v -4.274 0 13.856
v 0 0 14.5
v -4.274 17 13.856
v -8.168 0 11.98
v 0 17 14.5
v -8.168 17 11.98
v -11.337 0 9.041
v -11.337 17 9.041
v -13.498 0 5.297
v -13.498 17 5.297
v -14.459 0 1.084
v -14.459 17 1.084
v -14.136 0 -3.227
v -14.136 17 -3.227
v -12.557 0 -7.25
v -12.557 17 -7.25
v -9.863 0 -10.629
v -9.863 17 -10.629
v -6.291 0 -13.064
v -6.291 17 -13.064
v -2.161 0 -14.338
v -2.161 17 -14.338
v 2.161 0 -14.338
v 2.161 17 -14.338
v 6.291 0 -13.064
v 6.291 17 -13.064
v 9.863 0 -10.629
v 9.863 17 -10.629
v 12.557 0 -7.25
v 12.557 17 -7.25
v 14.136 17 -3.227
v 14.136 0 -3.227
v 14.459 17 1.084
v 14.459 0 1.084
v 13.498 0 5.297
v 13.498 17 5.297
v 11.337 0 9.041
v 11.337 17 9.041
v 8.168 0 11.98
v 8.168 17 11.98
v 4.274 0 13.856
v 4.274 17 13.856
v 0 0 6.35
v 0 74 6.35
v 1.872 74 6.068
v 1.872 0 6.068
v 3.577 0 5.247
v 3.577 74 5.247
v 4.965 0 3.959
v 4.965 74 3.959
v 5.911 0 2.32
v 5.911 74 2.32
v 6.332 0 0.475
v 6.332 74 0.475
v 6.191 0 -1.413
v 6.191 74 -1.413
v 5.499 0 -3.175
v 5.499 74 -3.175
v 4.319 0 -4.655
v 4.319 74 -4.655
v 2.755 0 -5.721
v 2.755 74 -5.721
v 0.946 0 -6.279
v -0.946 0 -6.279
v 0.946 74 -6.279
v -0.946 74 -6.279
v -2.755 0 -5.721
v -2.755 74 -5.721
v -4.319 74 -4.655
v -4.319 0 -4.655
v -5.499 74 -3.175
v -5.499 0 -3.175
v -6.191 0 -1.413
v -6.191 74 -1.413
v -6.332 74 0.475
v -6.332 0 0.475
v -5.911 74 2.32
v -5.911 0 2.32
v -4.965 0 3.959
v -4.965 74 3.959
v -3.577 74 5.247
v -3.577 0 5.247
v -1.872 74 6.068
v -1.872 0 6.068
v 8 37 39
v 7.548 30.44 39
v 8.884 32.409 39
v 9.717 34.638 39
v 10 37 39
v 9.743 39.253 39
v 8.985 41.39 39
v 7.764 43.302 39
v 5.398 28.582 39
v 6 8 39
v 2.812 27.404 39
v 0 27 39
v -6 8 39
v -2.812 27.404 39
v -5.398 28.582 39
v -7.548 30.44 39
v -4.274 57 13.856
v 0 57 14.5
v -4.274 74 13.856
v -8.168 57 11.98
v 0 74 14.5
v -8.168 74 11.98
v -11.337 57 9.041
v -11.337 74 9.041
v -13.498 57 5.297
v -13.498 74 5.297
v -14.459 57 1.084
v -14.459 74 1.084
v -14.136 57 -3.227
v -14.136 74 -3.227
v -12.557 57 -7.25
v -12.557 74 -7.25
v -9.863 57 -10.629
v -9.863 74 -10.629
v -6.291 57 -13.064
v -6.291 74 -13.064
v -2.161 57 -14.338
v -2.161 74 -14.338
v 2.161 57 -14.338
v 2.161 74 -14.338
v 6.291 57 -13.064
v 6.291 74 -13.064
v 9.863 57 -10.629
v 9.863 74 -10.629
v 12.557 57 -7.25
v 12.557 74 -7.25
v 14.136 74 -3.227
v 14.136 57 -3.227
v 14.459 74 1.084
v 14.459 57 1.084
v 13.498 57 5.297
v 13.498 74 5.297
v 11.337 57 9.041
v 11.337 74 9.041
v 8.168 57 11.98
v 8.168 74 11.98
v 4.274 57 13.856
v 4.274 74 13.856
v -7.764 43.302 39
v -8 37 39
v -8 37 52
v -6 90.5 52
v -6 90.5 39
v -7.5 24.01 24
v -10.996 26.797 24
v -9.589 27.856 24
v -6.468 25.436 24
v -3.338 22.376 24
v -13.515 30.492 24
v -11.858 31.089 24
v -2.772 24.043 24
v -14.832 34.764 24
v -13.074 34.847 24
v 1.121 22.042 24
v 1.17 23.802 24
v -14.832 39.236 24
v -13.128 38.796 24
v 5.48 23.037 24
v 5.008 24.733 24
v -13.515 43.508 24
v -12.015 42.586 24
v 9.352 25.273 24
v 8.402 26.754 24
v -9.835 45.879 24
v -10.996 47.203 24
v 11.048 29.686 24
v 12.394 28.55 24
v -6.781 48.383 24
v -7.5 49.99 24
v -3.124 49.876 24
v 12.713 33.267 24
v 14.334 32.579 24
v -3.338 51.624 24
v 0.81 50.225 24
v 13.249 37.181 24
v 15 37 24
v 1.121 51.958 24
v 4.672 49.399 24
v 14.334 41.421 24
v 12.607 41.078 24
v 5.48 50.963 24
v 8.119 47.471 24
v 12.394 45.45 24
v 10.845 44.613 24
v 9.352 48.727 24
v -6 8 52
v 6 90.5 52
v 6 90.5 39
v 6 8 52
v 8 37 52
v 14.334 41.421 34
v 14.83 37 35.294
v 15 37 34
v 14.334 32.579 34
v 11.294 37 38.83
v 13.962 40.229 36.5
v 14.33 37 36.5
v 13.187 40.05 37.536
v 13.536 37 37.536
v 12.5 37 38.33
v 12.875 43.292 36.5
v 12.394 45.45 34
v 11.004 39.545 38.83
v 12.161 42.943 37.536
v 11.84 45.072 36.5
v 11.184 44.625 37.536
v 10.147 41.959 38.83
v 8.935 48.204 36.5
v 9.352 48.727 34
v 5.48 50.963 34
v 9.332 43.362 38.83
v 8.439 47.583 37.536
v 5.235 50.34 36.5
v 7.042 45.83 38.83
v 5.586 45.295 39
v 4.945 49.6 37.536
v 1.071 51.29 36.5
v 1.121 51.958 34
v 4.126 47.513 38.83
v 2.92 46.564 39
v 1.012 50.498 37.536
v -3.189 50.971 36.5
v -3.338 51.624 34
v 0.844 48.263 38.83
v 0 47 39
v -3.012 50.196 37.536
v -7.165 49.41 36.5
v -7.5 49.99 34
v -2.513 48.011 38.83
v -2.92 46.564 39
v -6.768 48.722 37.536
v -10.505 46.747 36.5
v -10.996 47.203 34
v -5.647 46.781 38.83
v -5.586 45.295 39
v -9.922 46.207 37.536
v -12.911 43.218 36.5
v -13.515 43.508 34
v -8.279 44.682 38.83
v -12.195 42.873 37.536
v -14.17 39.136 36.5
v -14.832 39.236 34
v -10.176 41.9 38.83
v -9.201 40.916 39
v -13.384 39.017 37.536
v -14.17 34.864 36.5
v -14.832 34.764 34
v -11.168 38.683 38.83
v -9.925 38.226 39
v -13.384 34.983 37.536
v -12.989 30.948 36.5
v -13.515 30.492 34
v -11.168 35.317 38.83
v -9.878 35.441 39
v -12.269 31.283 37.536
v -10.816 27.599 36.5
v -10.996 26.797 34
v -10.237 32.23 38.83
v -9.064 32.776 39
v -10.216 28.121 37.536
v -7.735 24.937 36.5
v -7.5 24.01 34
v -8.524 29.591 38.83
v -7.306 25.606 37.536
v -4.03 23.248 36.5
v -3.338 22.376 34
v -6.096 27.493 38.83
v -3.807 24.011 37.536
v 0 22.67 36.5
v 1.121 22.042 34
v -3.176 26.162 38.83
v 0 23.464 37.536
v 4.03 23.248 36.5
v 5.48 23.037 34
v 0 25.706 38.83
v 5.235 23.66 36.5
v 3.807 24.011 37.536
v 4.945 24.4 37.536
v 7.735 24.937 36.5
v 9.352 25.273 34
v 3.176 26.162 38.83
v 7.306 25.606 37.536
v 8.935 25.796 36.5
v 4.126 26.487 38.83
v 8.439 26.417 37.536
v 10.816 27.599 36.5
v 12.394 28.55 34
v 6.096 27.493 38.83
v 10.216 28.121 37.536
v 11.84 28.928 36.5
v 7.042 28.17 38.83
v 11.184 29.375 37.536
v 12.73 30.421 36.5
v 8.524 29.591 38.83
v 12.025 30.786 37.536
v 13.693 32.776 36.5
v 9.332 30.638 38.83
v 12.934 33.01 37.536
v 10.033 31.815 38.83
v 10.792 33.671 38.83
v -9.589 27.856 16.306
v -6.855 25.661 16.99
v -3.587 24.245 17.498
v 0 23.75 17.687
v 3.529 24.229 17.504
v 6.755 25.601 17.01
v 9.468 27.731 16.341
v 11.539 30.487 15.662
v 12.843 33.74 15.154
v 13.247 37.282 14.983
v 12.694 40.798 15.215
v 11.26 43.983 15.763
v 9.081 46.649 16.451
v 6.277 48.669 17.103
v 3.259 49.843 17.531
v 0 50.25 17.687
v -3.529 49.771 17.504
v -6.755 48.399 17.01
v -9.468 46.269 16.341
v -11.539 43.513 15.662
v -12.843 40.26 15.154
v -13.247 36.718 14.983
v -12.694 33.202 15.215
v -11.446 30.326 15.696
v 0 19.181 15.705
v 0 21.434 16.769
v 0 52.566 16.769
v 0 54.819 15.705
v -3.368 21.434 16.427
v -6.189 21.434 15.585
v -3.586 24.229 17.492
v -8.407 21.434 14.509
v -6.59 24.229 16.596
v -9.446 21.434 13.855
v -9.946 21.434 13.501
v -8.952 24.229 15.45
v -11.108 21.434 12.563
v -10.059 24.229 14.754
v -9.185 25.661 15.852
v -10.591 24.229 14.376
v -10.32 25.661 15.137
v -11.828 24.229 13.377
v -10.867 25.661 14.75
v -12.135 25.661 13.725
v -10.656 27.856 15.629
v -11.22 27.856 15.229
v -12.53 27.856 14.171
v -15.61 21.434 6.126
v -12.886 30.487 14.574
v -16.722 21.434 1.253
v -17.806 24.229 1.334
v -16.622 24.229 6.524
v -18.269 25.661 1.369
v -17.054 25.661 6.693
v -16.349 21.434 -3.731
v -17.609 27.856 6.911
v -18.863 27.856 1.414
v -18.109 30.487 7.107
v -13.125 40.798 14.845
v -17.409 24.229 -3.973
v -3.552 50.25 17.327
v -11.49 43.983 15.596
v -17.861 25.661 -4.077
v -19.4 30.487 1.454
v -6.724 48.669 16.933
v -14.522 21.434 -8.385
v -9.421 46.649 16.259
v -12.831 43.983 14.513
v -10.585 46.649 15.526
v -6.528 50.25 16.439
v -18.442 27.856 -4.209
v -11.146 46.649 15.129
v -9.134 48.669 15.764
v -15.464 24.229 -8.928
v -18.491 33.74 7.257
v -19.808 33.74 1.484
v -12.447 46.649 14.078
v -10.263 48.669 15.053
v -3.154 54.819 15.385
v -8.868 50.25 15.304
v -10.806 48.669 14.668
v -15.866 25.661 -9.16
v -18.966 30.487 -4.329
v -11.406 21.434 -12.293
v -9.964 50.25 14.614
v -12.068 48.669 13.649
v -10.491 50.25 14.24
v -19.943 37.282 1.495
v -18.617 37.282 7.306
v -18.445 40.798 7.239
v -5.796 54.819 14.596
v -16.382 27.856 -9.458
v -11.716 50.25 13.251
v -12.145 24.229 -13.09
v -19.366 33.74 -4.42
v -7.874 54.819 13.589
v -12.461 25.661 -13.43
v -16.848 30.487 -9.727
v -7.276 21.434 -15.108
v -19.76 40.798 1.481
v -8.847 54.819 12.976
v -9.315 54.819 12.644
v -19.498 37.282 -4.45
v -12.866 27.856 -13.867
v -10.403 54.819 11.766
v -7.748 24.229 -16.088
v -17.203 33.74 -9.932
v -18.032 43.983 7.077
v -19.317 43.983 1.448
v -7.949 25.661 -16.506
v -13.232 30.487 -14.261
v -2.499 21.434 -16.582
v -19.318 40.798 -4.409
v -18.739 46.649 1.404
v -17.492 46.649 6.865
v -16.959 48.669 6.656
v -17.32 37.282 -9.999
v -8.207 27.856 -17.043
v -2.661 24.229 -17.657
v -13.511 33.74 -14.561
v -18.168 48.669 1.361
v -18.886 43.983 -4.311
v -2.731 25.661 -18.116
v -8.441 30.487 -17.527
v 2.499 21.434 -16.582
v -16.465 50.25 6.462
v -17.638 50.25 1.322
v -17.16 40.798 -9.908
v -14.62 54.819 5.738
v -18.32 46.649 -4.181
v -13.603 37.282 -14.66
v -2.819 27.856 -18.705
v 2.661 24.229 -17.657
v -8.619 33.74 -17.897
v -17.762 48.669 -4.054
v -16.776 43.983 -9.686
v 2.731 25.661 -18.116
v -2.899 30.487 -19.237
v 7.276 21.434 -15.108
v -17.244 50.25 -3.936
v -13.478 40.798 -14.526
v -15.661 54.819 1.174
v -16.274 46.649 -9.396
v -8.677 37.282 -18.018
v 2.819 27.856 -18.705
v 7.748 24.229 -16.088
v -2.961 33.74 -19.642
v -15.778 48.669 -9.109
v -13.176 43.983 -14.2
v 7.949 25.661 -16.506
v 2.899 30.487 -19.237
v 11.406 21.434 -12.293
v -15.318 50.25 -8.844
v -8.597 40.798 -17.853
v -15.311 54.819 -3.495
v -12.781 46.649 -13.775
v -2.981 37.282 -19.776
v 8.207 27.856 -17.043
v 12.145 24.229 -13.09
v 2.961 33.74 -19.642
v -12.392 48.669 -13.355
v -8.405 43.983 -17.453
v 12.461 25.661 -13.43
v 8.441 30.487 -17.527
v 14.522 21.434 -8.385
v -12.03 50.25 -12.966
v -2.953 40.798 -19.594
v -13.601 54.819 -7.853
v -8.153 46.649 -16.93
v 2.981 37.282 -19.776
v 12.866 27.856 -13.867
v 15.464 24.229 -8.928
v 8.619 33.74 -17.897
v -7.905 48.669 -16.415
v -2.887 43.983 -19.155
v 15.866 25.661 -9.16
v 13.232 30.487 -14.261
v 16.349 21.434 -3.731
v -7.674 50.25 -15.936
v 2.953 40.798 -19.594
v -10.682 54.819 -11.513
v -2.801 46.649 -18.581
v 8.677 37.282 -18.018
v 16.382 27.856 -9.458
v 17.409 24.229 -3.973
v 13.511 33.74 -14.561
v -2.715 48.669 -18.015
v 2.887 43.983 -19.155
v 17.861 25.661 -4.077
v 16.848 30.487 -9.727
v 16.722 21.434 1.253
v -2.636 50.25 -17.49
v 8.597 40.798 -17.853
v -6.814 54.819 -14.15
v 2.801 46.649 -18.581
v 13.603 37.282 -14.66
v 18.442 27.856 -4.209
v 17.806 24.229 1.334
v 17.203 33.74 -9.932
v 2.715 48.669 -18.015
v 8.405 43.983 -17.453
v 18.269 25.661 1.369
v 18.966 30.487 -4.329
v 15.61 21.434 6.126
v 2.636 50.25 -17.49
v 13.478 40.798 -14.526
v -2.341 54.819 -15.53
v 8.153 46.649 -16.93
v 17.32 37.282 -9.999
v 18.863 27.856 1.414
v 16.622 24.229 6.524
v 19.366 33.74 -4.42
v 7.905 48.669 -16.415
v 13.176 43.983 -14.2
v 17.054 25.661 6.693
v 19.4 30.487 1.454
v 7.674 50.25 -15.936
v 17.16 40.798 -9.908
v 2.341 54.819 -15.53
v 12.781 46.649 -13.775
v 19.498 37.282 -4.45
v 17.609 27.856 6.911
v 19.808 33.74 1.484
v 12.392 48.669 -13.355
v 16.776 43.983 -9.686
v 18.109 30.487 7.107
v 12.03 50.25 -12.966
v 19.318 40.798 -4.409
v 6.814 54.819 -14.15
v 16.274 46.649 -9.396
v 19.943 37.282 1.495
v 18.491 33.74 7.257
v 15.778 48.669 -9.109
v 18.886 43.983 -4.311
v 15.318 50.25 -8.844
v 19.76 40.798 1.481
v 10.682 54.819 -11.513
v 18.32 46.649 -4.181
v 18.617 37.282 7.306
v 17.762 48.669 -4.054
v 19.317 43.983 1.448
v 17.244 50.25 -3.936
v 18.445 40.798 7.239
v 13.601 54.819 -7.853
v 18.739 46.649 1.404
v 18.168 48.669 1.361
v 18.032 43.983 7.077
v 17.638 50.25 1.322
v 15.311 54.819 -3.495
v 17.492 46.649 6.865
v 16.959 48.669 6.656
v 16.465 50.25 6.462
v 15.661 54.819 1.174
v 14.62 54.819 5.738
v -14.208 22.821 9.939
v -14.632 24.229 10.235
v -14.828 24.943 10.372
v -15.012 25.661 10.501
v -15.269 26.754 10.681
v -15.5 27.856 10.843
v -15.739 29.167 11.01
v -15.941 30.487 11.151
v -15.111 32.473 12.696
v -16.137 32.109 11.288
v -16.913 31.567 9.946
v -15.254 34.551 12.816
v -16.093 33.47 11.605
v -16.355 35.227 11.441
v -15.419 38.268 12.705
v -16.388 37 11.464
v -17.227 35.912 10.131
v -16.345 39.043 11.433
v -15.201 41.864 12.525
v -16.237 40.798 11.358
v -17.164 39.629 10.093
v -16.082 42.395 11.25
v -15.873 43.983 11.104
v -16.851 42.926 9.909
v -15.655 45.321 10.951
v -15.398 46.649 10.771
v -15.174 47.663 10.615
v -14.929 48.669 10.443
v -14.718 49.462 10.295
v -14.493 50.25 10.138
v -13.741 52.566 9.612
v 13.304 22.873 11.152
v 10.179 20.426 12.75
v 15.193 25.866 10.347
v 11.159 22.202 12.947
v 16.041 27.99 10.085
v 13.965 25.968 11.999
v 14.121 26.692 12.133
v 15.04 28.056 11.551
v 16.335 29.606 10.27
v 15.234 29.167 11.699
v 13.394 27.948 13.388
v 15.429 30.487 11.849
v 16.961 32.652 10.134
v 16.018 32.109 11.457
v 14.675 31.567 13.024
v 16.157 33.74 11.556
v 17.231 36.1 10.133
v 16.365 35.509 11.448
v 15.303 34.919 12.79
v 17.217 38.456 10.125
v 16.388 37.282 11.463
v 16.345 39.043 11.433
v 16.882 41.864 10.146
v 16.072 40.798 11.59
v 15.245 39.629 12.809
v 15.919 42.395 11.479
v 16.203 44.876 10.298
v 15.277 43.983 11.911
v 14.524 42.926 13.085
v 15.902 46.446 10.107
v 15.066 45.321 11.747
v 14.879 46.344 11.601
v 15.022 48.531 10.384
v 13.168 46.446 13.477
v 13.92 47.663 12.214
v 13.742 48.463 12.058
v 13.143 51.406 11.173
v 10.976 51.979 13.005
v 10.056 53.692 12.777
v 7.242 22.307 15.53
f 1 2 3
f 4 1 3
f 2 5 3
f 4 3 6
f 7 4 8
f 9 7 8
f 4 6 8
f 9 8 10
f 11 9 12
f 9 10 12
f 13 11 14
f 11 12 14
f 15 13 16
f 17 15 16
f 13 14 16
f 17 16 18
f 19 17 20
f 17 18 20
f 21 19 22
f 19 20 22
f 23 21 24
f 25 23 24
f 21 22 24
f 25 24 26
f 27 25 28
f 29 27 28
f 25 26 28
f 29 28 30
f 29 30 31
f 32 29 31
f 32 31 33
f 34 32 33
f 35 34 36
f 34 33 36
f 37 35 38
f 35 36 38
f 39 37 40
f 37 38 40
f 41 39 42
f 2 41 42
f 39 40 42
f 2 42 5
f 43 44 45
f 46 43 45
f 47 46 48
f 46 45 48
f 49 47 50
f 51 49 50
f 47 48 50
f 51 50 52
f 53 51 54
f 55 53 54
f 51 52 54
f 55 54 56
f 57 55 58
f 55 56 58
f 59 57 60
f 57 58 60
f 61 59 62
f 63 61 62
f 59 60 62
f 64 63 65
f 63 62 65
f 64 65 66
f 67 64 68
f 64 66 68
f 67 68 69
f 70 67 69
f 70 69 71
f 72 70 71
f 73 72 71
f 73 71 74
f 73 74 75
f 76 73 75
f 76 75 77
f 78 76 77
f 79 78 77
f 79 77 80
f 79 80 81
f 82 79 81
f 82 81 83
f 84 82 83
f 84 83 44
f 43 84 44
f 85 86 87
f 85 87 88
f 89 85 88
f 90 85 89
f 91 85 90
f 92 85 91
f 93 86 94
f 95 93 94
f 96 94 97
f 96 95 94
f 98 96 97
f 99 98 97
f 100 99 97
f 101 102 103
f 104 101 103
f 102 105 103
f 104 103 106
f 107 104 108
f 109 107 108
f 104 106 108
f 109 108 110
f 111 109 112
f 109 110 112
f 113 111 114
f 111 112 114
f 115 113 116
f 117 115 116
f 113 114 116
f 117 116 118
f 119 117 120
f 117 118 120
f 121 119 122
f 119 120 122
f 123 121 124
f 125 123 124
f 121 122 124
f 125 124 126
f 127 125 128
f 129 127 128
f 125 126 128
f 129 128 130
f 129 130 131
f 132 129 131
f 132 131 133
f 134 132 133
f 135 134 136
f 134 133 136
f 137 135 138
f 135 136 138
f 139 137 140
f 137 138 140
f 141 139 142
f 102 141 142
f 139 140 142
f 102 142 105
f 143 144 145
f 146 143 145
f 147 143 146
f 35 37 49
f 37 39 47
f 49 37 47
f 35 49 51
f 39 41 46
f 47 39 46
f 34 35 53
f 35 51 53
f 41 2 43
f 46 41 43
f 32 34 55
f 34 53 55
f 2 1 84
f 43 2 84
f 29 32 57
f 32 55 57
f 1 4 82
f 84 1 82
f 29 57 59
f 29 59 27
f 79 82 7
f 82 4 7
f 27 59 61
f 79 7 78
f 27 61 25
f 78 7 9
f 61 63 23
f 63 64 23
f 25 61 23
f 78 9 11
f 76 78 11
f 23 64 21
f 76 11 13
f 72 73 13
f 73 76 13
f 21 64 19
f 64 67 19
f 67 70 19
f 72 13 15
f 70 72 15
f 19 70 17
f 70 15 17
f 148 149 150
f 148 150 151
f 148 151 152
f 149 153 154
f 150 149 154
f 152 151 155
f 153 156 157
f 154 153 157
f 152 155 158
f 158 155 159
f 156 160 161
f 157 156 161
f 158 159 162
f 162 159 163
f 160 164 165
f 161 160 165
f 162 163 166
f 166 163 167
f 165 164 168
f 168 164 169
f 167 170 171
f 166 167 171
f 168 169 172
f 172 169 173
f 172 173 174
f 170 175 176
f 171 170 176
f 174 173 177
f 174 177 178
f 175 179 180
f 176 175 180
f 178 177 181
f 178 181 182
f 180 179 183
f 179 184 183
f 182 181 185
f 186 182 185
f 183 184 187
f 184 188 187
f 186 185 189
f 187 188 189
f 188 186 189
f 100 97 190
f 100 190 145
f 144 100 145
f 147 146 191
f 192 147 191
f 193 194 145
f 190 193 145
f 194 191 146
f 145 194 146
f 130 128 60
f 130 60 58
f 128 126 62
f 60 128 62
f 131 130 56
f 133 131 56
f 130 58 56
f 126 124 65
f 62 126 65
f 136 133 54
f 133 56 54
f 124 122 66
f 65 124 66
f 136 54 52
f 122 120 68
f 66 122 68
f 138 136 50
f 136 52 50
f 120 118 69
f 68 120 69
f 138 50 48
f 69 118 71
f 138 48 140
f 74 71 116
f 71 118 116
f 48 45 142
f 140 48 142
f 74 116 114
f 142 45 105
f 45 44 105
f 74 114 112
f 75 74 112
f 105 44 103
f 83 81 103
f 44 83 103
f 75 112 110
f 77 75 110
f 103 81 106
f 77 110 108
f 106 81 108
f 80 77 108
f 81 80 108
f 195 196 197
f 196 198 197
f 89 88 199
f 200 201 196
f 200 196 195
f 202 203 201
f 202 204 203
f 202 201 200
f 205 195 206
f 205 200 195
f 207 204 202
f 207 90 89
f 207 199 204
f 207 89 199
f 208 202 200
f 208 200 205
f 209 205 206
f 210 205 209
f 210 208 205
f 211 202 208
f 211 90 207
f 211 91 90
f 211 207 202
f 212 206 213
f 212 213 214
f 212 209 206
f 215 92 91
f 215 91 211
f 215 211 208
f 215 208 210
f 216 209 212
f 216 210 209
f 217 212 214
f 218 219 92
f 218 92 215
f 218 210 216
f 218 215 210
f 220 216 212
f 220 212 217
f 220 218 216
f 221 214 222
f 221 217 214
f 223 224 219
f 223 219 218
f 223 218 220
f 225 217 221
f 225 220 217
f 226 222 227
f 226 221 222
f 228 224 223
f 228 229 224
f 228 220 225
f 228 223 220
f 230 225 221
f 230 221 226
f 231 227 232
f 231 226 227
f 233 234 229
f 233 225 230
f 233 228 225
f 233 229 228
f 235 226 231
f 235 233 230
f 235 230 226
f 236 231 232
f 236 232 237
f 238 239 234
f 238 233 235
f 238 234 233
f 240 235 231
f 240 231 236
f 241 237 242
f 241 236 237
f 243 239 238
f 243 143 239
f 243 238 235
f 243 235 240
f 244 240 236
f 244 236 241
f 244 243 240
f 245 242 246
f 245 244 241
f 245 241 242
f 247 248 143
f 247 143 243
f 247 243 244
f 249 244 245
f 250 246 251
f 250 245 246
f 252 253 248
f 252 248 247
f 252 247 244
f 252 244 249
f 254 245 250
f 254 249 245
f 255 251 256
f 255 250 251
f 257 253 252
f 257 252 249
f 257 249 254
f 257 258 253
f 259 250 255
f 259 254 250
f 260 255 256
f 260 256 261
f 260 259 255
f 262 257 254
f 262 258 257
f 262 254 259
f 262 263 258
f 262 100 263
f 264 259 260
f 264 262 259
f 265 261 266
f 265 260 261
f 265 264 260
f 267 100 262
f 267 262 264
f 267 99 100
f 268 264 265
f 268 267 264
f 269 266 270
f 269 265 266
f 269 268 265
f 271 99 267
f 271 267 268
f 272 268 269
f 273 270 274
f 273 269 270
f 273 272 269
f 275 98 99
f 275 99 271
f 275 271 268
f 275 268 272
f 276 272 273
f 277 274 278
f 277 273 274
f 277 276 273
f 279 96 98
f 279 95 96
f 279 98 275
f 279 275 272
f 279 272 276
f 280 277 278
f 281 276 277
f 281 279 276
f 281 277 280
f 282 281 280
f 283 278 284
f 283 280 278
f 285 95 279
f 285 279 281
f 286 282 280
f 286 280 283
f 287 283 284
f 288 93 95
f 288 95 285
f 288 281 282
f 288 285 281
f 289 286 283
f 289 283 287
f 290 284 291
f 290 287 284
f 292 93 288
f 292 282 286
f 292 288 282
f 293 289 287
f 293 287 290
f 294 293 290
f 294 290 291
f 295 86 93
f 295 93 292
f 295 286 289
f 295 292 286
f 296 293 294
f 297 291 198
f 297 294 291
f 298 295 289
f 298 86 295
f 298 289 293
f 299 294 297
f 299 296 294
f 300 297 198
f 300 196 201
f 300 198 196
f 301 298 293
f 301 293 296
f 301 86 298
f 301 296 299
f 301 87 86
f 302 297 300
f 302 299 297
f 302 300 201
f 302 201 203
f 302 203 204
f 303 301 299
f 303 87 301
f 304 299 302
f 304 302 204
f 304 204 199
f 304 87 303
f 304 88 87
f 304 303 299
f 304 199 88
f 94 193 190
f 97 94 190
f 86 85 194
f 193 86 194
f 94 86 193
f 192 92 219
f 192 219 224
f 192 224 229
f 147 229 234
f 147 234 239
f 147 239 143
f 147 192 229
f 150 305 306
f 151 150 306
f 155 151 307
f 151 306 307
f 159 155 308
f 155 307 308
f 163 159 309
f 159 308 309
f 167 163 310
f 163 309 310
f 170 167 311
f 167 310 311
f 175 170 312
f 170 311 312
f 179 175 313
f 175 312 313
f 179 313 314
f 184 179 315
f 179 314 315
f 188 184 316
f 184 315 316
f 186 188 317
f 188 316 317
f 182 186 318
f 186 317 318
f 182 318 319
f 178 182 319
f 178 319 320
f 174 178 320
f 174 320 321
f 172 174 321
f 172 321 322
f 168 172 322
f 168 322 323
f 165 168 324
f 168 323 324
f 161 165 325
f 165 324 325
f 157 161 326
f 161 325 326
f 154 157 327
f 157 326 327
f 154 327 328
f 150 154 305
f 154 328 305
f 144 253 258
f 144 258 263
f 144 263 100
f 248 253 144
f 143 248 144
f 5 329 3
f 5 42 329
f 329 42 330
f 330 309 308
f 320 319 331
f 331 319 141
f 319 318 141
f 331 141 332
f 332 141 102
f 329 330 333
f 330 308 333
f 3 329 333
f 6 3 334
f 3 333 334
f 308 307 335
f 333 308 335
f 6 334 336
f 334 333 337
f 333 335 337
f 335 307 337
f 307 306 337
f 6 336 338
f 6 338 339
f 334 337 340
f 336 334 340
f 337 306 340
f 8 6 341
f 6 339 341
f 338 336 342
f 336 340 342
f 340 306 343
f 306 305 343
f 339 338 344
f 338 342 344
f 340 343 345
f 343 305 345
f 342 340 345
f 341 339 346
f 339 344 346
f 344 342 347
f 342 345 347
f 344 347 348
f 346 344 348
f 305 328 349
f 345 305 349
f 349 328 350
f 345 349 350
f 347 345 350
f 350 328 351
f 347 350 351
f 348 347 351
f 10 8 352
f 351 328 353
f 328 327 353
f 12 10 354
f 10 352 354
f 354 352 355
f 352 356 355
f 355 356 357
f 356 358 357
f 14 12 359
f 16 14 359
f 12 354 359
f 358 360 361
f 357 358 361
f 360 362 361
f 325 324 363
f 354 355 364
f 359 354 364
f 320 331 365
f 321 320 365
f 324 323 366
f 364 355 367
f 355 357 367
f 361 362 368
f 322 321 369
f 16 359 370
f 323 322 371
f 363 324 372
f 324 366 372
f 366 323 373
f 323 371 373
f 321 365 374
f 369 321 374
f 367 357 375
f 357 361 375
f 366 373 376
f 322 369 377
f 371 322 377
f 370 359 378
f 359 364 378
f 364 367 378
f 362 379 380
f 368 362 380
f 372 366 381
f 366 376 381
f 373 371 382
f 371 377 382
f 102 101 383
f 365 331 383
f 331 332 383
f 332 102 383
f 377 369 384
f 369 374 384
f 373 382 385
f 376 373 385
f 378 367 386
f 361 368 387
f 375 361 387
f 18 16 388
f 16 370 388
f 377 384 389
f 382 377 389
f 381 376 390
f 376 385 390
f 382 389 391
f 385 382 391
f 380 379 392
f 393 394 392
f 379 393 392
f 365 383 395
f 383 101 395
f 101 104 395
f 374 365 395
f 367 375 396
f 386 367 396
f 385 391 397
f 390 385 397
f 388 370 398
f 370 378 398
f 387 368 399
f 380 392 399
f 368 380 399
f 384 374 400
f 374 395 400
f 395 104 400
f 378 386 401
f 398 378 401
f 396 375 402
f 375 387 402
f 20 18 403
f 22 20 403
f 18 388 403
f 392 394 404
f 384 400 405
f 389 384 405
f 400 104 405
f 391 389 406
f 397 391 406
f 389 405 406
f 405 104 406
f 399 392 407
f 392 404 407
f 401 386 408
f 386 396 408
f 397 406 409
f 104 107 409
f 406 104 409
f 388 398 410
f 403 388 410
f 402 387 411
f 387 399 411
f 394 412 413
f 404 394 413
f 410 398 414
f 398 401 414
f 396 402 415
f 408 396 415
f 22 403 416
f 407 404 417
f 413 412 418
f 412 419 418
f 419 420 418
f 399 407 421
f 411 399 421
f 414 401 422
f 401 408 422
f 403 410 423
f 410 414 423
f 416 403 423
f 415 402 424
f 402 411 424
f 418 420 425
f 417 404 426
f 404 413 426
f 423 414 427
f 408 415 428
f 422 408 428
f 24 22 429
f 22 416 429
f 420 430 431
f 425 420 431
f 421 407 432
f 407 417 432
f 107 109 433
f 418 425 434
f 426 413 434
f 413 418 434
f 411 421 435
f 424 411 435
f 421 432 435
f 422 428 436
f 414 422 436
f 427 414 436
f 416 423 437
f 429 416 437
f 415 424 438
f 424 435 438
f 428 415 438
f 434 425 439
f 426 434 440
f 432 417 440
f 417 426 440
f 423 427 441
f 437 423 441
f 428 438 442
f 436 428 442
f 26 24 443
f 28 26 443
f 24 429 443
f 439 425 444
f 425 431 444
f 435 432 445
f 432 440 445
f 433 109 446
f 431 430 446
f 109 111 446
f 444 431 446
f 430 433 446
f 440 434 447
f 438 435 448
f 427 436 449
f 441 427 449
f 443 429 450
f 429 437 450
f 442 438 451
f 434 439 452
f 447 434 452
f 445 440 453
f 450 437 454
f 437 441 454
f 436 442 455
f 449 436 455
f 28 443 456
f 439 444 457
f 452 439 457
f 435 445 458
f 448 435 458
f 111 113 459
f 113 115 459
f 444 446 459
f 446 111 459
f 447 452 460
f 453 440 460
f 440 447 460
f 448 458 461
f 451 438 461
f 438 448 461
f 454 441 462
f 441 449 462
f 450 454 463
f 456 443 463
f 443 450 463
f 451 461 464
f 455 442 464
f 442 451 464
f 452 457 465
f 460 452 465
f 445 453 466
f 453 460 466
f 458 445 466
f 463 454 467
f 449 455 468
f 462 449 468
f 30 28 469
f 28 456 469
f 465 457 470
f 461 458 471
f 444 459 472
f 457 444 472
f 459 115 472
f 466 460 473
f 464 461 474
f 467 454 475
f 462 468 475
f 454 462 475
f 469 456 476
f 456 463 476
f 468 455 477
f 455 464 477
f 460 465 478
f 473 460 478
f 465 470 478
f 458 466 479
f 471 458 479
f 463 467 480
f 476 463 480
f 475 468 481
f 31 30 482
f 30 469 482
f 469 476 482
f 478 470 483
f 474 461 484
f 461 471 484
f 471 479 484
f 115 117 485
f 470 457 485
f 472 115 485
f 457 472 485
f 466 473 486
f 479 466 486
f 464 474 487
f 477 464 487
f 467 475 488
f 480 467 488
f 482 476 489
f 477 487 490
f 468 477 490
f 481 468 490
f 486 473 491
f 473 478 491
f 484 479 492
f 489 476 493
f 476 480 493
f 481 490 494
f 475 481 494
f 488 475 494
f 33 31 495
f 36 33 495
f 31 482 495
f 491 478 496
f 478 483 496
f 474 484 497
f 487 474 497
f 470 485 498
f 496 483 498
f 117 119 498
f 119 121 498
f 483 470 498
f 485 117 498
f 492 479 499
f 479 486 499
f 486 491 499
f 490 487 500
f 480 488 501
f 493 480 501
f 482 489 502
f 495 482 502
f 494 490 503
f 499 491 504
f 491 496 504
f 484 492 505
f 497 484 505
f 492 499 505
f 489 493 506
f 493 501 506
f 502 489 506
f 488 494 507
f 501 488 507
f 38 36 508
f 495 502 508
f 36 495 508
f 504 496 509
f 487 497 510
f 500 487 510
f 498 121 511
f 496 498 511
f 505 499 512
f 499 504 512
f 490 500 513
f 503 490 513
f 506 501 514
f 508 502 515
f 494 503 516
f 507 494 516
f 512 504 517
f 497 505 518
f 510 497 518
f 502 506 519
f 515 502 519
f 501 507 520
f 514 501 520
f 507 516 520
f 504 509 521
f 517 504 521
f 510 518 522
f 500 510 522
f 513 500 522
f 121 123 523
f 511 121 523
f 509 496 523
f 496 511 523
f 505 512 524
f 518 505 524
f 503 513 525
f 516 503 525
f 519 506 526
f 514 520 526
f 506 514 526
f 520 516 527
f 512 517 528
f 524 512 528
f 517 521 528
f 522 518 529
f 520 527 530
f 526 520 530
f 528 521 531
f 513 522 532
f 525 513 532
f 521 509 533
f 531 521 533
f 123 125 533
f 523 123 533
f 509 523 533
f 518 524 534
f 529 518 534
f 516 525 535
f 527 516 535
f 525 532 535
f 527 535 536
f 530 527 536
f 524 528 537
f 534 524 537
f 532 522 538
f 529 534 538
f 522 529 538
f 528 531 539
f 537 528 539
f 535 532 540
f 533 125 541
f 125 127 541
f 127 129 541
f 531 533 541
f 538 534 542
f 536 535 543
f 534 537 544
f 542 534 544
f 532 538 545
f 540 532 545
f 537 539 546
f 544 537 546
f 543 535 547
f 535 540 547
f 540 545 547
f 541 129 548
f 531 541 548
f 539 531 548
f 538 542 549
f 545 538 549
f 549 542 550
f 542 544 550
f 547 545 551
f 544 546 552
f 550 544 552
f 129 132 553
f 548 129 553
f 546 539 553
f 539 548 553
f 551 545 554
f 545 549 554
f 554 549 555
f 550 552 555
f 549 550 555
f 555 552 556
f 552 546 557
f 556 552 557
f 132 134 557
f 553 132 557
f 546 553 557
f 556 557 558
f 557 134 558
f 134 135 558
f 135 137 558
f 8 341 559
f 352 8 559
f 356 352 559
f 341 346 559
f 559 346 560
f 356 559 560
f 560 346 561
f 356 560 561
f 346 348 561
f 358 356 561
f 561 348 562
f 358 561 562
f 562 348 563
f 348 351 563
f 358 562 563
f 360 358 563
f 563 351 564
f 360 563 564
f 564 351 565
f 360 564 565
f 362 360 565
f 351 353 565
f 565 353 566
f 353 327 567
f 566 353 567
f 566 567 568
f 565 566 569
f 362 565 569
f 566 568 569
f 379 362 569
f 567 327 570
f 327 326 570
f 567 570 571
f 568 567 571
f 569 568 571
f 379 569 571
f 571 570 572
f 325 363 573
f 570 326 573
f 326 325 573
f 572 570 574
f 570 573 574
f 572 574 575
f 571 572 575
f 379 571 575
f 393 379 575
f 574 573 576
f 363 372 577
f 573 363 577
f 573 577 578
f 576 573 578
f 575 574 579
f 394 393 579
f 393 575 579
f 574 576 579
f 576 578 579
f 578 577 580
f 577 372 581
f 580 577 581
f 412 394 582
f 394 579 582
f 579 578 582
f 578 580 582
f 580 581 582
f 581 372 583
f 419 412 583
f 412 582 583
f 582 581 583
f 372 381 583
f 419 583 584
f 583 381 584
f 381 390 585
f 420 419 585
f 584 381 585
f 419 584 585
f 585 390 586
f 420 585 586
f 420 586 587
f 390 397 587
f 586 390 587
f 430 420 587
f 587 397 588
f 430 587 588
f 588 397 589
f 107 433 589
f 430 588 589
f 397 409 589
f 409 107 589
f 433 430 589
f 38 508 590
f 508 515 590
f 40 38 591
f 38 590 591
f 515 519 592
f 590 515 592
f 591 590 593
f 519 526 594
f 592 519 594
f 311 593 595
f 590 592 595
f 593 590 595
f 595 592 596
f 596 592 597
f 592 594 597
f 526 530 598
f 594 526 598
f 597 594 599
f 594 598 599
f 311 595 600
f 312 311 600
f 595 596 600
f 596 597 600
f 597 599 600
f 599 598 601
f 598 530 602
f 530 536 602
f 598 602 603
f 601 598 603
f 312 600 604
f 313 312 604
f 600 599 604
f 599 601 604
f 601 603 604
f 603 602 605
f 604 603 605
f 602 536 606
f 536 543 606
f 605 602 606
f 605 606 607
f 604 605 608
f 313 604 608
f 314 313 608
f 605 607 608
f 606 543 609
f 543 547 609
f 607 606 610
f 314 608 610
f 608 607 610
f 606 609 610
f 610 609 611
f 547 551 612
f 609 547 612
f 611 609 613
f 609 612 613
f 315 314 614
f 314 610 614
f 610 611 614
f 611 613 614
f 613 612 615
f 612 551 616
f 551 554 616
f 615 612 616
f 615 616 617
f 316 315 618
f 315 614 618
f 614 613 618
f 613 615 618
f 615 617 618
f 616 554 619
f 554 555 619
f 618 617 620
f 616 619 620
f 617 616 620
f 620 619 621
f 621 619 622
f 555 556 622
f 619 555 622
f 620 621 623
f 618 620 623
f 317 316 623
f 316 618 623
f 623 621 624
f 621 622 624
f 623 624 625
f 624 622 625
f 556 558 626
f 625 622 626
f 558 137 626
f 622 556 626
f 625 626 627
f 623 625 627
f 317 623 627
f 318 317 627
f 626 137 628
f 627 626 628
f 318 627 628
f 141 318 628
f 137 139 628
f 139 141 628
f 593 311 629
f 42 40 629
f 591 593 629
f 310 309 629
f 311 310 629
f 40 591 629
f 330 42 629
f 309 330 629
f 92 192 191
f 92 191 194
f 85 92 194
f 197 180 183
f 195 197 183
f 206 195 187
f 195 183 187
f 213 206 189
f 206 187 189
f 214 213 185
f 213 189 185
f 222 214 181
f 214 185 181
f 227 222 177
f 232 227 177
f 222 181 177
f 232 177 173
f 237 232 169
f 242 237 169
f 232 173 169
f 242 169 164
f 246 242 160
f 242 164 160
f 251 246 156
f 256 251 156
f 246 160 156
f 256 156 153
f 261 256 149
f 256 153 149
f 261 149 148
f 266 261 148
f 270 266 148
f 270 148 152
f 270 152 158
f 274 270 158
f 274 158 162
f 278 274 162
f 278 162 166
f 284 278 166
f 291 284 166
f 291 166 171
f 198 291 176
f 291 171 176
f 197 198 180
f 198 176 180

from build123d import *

# Parameters (mm, degrees)
CROQUIS2_R              = 6.35
CORTAR_EXTRUIR1_DEPTH   = 80.221209332
CROQUIS3_R              = 13.25
SALIENTE_EXTRUIR1_DEPTH = 24
CROQUIS4_R              = 6.35
CORTAR_EXTRUIR2_DEPTH   = 81.324342659
CROQUIS5_R              = 15
SALIENTE_EXTRUIR2_DEPTH = 15
REDONDEO1_R             = 5
SALIENTE_EXTRUIR3_DEPTH = 13


with BuildPart() as part:
    # Croquis1 → Revolución1 (revolve)
    with BuildSketch(Plane.XY, mode=Mode.PRIVATE) as revoluci_n1_sk:
        with BuildLine():
            Line((0, 0), (14.5, 0))
            Line((14.5, 0), (14.5, 17))
            ThreePointArc((14.5, 17), (20, 37), (14.5, 57))
            Line((14.5, 57), (14.5, 74))
            Line((14.5, 74), (0, 74))
            Line((0, 74), (0, 0))
        make_face()
    revolve(revoluci_n1_sk.sketch.rotate(Axis((0, 74, 0), (0, -1, 0)), 90), axis=Axis((0, 74, 0), (0, -1, 0)))

    # Croquis2 → Cortar-Extruir1 (cut, through all)
    with BuildSketch(Plane(origin=(0, 74, 0), x_dir=(1, 0, 0), z_dir=(0, 1, 0))):
        with Locations(Location((0, 0, 0), (0, 0, 270))):
            Circle(CROQUIS2_R)
    extrude(amount=-CORTAR_EXTRUIR1_DEPTH, mode=Mode.SUBTRACT)

    # Croquis3 → Saliente-Extruir1 (add)
    with BuildSketch(Plane.XY):
        with Locations(Location((0, 37, 0), (0, 0, 223.63840605))):
            Circle(CROQUIS3_R)
    extrude(amount=SALIENTE_EXTRUIR1_DEPTH)

    # Croquis4 → Cortar-Extruir2 (cut, through all)
    with BuildSketch(Plane(origin=(0, 74, 0), x_dir=(1, 0, 0), z_dir=(0, 1, 0))):
        with Locations(Location((0, 0, 0), (0, 0, 270))):
            Circle(CROQUIS4_R)
    extrude(amount=-CORTAR_EXTRUIR2_DEPTH, mode=Mode.SUBTRACT)

    # Croquis5 → Saliente-Extruir2 (add)
    with BuildSketch(Plane.XY.offset(24)):
        with Locations((0, 37)):
            Circle(CROQUIS5_R)
    extrude(amount=SALIENTE_EXTRUIR2_DEPTH)

    # Redondeo1
    redondeo1_edges = [part.edges().sort_by_distance(p)[0] for p in [
        (-15, 37, 39),
    ]]
    fillet(redondeo1_edges, radius=REDONDEO1_R)

    # Croquis7 → Saliente-Extruir3 (add)
    with BuildSketch(Plane.XY.offset(39)):
        Polygon((-6, 90.5), (6, 90.5), (8, 37), (6, 8), (-6, 8), (-8, 37), align=None)
    extrude(amount=SALIENTE_EXTRUIR3_DEPTH)


solid = part.part
